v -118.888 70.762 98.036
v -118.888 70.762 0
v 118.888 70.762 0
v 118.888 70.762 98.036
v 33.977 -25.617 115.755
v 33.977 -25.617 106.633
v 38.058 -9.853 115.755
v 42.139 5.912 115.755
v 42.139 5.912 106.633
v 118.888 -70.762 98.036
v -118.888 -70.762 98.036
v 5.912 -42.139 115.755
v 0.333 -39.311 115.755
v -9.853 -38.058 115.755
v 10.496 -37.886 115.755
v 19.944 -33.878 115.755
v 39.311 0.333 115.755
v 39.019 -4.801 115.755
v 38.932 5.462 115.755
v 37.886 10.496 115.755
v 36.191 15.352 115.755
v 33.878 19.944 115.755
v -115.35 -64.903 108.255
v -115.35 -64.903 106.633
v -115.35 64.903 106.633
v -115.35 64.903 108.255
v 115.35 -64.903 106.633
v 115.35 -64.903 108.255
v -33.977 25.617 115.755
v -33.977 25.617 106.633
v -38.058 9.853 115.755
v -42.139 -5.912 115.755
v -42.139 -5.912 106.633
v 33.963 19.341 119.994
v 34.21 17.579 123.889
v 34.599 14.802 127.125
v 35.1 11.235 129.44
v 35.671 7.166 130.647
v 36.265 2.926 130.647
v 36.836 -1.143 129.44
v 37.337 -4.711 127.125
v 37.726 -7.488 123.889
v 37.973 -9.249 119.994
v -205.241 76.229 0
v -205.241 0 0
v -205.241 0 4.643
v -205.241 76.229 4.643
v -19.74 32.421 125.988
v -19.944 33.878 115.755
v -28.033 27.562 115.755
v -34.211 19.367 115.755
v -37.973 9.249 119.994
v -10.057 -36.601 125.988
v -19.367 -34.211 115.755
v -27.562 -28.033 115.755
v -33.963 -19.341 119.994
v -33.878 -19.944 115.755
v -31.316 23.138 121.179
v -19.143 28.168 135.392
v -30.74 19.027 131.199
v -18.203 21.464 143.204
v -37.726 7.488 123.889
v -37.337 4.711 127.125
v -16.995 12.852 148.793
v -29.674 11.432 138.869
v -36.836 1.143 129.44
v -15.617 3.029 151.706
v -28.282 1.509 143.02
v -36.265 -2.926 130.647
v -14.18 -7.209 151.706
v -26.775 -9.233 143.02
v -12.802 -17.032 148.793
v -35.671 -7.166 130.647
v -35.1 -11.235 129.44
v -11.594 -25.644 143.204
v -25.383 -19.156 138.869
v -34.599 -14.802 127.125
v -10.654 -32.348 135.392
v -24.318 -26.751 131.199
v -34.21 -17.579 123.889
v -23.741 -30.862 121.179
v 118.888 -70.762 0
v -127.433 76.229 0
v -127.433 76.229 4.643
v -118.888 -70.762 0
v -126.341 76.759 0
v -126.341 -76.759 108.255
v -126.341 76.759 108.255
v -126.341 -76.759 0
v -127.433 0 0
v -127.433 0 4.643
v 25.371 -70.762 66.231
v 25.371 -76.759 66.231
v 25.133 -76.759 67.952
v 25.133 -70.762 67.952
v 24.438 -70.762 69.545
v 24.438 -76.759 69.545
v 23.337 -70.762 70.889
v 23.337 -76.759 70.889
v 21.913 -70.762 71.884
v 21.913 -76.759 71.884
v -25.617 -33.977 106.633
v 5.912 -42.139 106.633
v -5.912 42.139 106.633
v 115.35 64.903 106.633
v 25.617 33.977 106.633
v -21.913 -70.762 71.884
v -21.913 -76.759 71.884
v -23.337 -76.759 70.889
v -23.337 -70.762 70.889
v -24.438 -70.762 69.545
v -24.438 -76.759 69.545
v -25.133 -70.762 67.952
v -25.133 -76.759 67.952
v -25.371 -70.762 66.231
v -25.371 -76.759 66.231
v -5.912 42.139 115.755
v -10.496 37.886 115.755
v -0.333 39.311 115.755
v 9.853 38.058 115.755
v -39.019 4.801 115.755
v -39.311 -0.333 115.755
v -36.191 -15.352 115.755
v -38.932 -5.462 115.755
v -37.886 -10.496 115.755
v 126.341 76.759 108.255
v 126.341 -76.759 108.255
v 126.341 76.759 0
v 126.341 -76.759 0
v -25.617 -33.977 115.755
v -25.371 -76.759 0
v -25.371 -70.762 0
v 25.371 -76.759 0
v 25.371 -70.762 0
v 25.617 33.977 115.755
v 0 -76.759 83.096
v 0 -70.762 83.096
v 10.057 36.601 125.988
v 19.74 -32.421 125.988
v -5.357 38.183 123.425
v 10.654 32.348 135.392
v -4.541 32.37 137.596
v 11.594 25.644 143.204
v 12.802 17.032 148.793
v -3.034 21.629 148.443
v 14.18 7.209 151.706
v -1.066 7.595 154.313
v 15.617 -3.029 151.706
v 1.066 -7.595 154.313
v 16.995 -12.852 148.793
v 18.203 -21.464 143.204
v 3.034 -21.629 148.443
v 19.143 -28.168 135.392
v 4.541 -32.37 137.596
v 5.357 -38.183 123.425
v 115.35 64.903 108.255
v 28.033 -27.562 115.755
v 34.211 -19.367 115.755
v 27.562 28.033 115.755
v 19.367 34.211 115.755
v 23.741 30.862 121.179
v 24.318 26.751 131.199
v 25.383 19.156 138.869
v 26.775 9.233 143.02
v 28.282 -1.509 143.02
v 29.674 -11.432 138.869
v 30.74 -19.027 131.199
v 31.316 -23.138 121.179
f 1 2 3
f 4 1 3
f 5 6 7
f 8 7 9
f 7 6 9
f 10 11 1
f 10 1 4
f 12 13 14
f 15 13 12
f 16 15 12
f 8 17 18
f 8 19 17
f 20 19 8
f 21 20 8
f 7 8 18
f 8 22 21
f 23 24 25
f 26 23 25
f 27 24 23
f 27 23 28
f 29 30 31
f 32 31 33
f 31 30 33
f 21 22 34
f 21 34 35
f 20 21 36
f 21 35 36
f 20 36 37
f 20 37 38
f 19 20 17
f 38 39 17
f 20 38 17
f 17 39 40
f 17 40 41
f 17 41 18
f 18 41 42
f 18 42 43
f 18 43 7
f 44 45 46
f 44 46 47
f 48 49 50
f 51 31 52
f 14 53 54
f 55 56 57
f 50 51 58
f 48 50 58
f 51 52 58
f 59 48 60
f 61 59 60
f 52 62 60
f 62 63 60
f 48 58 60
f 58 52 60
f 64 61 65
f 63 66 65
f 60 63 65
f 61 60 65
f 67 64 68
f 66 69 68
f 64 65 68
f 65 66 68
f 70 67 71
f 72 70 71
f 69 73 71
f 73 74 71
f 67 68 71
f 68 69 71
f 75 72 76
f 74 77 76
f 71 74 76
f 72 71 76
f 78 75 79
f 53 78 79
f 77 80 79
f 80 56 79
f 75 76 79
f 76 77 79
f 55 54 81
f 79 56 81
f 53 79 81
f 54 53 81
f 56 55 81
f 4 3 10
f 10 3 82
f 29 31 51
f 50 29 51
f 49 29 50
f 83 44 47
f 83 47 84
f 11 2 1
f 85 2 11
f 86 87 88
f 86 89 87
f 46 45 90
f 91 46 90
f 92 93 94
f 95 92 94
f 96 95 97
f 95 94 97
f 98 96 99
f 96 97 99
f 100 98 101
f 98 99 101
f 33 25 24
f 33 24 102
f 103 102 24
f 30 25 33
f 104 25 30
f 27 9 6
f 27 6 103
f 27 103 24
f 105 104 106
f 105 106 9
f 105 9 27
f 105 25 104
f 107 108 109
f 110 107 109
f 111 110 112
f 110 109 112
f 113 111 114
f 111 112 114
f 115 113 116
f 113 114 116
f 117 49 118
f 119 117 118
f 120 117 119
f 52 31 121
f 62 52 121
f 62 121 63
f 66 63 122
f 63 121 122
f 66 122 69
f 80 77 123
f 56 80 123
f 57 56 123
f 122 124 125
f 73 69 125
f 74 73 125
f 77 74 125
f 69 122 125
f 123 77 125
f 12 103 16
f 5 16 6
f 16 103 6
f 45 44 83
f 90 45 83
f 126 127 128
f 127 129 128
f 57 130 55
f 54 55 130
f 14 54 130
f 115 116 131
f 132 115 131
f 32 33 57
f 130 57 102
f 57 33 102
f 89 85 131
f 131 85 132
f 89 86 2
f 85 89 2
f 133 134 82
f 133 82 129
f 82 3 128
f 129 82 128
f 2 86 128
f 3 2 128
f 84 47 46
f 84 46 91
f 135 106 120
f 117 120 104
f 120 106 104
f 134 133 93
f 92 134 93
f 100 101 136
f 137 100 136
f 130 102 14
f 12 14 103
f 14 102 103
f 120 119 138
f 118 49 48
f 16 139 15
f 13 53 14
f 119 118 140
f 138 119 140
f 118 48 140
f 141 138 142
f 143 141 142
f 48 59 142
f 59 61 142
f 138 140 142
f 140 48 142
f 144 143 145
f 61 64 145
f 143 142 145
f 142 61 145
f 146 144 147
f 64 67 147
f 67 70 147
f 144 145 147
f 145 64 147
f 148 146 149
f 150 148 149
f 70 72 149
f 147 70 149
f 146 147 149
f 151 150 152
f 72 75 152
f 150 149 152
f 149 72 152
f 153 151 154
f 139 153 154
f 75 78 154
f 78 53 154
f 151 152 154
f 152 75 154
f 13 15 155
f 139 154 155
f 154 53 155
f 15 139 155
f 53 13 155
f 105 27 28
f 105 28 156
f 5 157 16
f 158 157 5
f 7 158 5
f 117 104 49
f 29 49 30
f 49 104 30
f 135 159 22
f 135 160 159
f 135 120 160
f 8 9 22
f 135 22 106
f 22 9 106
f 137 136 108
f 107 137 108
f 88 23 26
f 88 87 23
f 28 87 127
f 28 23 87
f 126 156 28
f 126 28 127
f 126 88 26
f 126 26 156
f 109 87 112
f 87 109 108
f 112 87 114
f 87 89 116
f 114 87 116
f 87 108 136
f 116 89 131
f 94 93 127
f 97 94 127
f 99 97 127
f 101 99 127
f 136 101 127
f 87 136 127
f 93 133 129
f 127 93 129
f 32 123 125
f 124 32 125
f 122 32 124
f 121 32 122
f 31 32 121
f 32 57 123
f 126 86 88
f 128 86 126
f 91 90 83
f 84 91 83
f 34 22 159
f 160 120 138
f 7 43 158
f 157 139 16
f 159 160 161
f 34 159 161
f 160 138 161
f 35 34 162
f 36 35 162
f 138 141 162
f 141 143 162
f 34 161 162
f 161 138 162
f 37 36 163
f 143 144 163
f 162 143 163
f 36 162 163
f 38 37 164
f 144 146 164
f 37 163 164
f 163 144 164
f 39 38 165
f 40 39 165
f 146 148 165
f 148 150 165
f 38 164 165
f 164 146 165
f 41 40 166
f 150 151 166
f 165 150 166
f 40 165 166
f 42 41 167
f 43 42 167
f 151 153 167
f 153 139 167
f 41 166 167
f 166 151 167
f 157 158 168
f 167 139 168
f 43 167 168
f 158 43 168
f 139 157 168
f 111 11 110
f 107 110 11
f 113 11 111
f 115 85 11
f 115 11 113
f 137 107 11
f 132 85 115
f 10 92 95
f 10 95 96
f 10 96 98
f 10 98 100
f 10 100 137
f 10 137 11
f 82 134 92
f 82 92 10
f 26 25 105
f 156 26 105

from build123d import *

# Parameters (mm, degrees)
F0_W      = 252.6827454567
F0_H      = 153.5182595253
F1_DEPTH  = 106.6326349974
F3_DEPTH  = 9.122794494
F6_W      = 252.6827454567
F6_H      = 153.5182595253
F6_W_2    = 230.6998372078
F6_H_2    = 129.8055052757
F7_DEPTH  = 1.6219746321
F9_DEPTH  = 6.3263718039
F10_W     = 237.7751469612
F10_H     = 141.5230035782
F11_DEPTH = 98.0363339186
F12_W     = 77.8074264526
F12_H     = 76.2286856771
F13_DEPTH = 4.6427845955


with BuildPart() as f1:
    # F0 (on Top) → F1 (new body)
    with BuildSketch(Plane.XY):
        Rectangle(F0_W, F0_H)
    extrude(amount=F1_DEPTH)

    # F2 (on face) → F3 (join)
    with BuildSketch(Plane.XY.offset(106.6326349974)):
        Polygon((-42.1391663881, -5.9115811494), (-25.6167711882, -33.9770094248), (5.9115811494, -42.1391663881), (33.9770094248, -25.6167711882), (42.1391663881, 5.9115811494), (25.6167711882, 33.9770094248), (-5.9115811494, 42.1391663881), (-33.9770094248, 25.6167711882), align=None)
    extrude(amount=F3_DEPTH)

    # F4 (on face) → F5 (revolve)
    with BuildSketch(Plane.XY.offset(115.7554294914)):
        with BuildLine():
            Line((-38.931513343, -5.4615888287), (38.931513343, 5.4615888287))
            ThreePointArc((38.931513343, 5.4615888287), (37.1179521217, 12.9518073642), (33.8779688325, 19.9442952117))
            ThreePointArc((33.8779688325, 19.9442952117), (23.6668107599, 31.3906634553), (9.852595347, 38.0580878216))
            ThreePointArc((9.852595347, 38.0580878216), (-5.461588509, 38.9315133879), (-19.9442950223, 33.8779689441))
            ThreePointArc((-19.9442950223, 33.8779689441), (-31.3906633892, 23.6668108477), (-38.0580878216, 9.852595347))
            ThreePointArc((-38.0580878216, 9.852595347), (-39.2489583443, 2.2385157127), (-38.931513343, -5.4615888287))
        make_face()
    revolve(axis=Axis((0, 0, 115.7554294914), (0.9903026693, 0.1389266826, 0)))

    # F6 (on face) → F7 (join)
    with BuildSketch(Plane.XY.offset(106.6326349974)):
        Rectangle(F6_W, F6_H)
        Rectangle(F6_W_2, F6_H_2, mode=Mode.SUBTRACT)
        Polygon((-33.9770094248, 25.6167711882), (-42.1391663881, -5.9115811494), (-25.6167711882, -33.9770094248), (5.9115811494, -42.1391663881), (33.9770094248, -25.6167711882), (42.1391663881, 5.9115811494), (25.6167711882, 33.9770094248), (-5.9115811494, 42.1391663881), align=None)
    extrude(amount=F7_DEPTH)

    # F8 (on face) → F9 (cut)
    with BuildSketch(Plane.XZ.offset(76.7591297626)):
        with BuildLine():
            Line((0, 83.0959156156), (0, 0))
            Line((0, 0), (25.3710448742, 0))
            Line((25.3710448742, 0), (25.3710448742, 66.2313618939))
            ThreePointArc((25.3710448742, 66.2313618939), (24.438075472, 69.544710578), (21.9133190466, 71.8844362886))
            Line((21.9133190466, 71.8844362886), (0, 83.0959156156))
        make_face()
        with BuildLine():
            Line((-25.3710448742, 0), (0, 0))
            Line((0, 0), (0, 83.0959156156))
            Line((0, 83.0959156156), (-21.9133190466, 71.8844362886))
            ThreePointArc((-21.9133190466, 71.8844362886), (-24.438075472, 69.544710578), (-25.3710448742, 66.2313618939))
            Line((-25.3710448742, 66.2313618939), (-25.3710448742, 0))
        make_face()
    extrude(amount=-F9_DEPTH, mode=Mode.SUBTRACT)

    # F10 (on face) → F11 (cut)
    with BuildSketch(Plane(origin=(0, 0, 0), x_dir=(1, 0, 0), z_dir=(0, 0, -1))):
        Rectangle(F10_W, F10_H)
    extrude(amount=-F11_DEPTH, mode=Mode.SUBTRACT)


with BuildPart() as f13:
    # F12 (on Top) → F13 (new body)
    with BuildSketch(Plane.XY):
        with Locations((-166.3370728493, 38.1143428385)):
            Rectangle(F12_W, F12_H)
    extrude(amount=F13_DEPTH)


solid = Compound([f1.part, f13.part])
